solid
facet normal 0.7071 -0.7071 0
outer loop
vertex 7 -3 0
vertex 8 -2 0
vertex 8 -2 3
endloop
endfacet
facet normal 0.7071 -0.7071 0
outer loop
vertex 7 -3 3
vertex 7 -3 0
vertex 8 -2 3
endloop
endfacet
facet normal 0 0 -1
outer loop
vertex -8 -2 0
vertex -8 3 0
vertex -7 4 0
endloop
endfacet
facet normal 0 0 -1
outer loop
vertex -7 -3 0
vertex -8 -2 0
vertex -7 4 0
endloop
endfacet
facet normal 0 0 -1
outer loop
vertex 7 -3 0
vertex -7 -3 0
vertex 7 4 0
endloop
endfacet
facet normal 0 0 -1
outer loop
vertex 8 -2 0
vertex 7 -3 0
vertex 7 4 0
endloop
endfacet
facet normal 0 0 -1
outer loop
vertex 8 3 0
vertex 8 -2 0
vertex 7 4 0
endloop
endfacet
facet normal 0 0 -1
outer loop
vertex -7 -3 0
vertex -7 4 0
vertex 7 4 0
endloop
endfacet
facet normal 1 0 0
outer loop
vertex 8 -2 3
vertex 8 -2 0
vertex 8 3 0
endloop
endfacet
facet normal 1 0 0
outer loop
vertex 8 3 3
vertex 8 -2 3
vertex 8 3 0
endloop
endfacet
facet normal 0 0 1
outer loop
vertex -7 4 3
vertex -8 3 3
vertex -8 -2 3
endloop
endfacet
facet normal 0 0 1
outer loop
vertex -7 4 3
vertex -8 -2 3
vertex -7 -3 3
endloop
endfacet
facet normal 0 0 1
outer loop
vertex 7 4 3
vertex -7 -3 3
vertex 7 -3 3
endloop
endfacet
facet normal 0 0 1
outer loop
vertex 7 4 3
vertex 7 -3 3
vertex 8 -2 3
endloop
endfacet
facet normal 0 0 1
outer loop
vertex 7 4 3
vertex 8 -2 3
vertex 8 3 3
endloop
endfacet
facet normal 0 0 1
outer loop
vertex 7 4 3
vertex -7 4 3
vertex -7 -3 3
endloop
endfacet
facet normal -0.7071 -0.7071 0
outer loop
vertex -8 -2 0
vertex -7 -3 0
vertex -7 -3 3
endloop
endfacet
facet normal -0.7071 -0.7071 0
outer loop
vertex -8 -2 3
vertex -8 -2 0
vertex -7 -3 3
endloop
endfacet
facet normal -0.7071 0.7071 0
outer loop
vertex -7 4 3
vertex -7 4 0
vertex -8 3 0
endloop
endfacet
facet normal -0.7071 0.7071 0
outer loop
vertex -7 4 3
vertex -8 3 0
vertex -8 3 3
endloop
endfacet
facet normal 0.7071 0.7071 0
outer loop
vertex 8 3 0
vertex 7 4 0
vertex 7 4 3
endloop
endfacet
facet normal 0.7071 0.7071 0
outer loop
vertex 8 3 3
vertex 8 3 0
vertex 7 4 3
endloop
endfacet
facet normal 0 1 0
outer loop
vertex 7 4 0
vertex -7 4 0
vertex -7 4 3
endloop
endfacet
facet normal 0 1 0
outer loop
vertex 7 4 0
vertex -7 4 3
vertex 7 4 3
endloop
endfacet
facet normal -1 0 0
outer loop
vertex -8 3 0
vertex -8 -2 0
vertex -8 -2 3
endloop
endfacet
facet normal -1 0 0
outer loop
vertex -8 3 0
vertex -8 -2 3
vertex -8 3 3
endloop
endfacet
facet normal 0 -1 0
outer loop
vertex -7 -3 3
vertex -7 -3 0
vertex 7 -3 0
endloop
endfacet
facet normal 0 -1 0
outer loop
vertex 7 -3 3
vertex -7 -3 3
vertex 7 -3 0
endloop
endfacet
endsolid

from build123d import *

# Parameters (mm, degrees)
SKETCH_1_W      = 16
SKETCH_1_H      = 7
EXTRUDE_1_DEPTH = 3
CHAMFER_2_SIZE  = 1


with BuildPart() as part:
    # Эскиз1 → Вытянуть1 (new body)
    with BuildSketch(Plane.XY):
        with Locations((0, 0.5)):
            Rectangle(SKETCH_1_W, SKETCH_1_H)
    extrude(amount=EXTRUDE_1_DEPTH)

    # Фаска2
    chamfer_2_edges = [part.edges().sort_by_distance(p)[0] for p in [
        (-8, 4, 1.5),
        (8, 4, 1.5),
        (8, -3, 1.5),
        (-8, -3, 1.5),
    ]]
    chamfer(chamfer_2_edges, length=CHAMFER_2_SIZE)


solid = part.part
